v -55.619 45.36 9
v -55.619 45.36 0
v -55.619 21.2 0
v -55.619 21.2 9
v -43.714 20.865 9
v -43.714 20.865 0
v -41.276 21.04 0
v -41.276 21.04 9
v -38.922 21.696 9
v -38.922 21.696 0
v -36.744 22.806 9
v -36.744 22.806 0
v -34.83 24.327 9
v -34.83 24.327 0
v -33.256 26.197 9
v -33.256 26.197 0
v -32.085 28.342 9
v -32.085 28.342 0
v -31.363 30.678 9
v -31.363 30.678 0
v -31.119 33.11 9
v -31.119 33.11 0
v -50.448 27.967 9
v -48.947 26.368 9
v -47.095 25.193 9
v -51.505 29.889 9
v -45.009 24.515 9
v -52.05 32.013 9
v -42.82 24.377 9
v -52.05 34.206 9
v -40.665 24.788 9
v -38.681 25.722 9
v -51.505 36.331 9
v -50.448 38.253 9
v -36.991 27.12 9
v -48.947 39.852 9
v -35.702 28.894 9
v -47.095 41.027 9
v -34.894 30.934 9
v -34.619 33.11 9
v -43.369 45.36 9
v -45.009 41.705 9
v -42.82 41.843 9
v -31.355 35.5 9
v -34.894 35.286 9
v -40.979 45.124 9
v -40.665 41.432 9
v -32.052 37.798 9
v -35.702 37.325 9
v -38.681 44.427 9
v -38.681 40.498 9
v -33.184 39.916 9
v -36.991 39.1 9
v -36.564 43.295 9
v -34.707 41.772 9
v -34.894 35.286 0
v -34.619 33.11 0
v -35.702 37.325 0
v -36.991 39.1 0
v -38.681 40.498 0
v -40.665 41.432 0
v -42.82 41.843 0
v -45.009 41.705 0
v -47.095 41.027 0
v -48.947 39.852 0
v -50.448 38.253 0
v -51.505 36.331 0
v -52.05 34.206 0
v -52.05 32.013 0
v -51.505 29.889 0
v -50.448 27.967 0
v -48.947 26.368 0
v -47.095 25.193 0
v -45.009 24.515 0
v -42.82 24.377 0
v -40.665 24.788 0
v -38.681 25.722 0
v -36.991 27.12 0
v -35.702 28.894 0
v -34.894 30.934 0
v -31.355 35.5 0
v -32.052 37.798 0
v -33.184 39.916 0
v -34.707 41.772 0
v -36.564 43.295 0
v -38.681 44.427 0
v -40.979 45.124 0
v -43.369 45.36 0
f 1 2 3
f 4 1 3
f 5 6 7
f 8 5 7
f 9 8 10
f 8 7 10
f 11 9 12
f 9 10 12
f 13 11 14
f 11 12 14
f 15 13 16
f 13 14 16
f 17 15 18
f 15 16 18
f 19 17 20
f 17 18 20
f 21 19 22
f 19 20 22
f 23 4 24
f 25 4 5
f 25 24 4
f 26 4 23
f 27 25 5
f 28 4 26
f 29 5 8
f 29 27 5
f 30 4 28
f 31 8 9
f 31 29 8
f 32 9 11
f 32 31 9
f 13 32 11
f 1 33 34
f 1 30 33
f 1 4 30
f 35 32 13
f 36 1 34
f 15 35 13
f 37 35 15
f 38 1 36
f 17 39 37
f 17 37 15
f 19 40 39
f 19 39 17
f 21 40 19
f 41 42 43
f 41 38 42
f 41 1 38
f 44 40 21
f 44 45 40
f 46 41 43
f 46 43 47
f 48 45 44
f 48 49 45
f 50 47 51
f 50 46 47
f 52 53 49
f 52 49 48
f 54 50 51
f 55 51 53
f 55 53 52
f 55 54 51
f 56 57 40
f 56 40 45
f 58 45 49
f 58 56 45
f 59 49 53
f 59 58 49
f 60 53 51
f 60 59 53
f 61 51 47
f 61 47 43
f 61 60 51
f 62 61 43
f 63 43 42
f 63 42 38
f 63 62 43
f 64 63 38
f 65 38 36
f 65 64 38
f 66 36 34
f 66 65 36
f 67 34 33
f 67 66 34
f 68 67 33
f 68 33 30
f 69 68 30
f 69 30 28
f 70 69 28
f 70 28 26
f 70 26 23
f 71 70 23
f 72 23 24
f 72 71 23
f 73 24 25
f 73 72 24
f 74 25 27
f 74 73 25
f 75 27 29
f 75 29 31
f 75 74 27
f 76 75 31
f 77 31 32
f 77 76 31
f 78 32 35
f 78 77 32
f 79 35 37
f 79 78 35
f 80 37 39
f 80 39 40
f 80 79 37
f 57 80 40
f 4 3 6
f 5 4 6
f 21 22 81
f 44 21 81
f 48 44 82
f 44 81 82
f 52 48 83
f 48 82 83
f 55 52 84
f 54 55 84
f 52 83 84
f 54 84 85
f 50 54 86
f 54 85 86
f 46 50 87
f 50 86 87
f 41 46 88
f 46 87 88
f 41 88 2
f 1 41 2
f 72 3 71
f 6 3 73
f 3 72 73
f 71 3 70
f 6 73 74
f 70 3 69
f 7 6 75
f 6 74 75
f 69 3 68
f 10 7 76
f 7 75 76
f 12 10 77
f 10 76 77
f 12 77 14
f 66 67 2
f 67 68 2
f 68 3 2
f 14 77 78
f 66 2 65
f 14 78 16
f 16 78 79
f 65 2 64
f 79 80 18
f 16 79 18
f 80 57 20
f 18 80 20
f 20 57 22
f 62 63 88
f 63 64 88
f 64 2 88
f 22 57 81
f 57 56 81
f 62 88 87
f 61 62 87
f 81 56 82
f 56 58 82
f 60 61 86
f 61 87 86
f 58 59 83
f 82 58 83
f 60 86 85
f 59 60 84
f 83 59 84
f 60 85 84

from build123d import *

# Parameters (mm, degrees)
F0_R     = 8.75
F1_DEPTH = 9


with BuildPart() as f1:
    # F0 (on Top) → F1 (new body)
    with BuildSketch(Plane.XY):
        with BuildLine():
            ThreePointArc((-55.6193343453, 33.109774836), (-52.0313924148, 41.7718329055), (-43.3693343453, 45.359774836))
            Line((-43.3693343453, 45.359774836), (-55.6193343453, 45.359774836))
            Line((-55.6193343453, 45.359774836), (-55.6193343453, 33.109774836))
        make_face()
        with BuildLine():
            Line((-55.6193343453, 21.200132486), (-43.7144180841, 20.8646363225))
            ThreePointArc((-43.7144180841, 20.8646363225), (-52.152550607, 24.570593839), (-55.6193343453, 33.109774836))
            Line((-55.6193343453, 33.109774836), (-55.6193343453, 21.200132486))
        make_face()
        with BuildLine():
            ThreePointArc((-43.7144180841, 20.8646363225), (-34.8301533483, 24.3265585742), (-31.1193343453, 33.109774836))
            ThreePointArc((-31.1193343453, 33.109774836), (-34.7072762757, 41.7718329055), (-43.3693343453, 45.359774836))
            ThreePointArc((-43.3693343453, 45.359774836), (-52.0313924148, 41.7718329055), (-55.6193343453, 33.109774836))
            ThreePointArc((-55.6193343453, 33.109774836), (-52.152550607, 24.570593839), (-43.7144180841, 20.8646363225))
        make_face()
        with Locations((-43.3693343453, 33.109774836)):
            Circle(F0_R, mode=Mode.SUBTRACT)
    extrude(amount=F1_DEPTH)


solid = f1.part
